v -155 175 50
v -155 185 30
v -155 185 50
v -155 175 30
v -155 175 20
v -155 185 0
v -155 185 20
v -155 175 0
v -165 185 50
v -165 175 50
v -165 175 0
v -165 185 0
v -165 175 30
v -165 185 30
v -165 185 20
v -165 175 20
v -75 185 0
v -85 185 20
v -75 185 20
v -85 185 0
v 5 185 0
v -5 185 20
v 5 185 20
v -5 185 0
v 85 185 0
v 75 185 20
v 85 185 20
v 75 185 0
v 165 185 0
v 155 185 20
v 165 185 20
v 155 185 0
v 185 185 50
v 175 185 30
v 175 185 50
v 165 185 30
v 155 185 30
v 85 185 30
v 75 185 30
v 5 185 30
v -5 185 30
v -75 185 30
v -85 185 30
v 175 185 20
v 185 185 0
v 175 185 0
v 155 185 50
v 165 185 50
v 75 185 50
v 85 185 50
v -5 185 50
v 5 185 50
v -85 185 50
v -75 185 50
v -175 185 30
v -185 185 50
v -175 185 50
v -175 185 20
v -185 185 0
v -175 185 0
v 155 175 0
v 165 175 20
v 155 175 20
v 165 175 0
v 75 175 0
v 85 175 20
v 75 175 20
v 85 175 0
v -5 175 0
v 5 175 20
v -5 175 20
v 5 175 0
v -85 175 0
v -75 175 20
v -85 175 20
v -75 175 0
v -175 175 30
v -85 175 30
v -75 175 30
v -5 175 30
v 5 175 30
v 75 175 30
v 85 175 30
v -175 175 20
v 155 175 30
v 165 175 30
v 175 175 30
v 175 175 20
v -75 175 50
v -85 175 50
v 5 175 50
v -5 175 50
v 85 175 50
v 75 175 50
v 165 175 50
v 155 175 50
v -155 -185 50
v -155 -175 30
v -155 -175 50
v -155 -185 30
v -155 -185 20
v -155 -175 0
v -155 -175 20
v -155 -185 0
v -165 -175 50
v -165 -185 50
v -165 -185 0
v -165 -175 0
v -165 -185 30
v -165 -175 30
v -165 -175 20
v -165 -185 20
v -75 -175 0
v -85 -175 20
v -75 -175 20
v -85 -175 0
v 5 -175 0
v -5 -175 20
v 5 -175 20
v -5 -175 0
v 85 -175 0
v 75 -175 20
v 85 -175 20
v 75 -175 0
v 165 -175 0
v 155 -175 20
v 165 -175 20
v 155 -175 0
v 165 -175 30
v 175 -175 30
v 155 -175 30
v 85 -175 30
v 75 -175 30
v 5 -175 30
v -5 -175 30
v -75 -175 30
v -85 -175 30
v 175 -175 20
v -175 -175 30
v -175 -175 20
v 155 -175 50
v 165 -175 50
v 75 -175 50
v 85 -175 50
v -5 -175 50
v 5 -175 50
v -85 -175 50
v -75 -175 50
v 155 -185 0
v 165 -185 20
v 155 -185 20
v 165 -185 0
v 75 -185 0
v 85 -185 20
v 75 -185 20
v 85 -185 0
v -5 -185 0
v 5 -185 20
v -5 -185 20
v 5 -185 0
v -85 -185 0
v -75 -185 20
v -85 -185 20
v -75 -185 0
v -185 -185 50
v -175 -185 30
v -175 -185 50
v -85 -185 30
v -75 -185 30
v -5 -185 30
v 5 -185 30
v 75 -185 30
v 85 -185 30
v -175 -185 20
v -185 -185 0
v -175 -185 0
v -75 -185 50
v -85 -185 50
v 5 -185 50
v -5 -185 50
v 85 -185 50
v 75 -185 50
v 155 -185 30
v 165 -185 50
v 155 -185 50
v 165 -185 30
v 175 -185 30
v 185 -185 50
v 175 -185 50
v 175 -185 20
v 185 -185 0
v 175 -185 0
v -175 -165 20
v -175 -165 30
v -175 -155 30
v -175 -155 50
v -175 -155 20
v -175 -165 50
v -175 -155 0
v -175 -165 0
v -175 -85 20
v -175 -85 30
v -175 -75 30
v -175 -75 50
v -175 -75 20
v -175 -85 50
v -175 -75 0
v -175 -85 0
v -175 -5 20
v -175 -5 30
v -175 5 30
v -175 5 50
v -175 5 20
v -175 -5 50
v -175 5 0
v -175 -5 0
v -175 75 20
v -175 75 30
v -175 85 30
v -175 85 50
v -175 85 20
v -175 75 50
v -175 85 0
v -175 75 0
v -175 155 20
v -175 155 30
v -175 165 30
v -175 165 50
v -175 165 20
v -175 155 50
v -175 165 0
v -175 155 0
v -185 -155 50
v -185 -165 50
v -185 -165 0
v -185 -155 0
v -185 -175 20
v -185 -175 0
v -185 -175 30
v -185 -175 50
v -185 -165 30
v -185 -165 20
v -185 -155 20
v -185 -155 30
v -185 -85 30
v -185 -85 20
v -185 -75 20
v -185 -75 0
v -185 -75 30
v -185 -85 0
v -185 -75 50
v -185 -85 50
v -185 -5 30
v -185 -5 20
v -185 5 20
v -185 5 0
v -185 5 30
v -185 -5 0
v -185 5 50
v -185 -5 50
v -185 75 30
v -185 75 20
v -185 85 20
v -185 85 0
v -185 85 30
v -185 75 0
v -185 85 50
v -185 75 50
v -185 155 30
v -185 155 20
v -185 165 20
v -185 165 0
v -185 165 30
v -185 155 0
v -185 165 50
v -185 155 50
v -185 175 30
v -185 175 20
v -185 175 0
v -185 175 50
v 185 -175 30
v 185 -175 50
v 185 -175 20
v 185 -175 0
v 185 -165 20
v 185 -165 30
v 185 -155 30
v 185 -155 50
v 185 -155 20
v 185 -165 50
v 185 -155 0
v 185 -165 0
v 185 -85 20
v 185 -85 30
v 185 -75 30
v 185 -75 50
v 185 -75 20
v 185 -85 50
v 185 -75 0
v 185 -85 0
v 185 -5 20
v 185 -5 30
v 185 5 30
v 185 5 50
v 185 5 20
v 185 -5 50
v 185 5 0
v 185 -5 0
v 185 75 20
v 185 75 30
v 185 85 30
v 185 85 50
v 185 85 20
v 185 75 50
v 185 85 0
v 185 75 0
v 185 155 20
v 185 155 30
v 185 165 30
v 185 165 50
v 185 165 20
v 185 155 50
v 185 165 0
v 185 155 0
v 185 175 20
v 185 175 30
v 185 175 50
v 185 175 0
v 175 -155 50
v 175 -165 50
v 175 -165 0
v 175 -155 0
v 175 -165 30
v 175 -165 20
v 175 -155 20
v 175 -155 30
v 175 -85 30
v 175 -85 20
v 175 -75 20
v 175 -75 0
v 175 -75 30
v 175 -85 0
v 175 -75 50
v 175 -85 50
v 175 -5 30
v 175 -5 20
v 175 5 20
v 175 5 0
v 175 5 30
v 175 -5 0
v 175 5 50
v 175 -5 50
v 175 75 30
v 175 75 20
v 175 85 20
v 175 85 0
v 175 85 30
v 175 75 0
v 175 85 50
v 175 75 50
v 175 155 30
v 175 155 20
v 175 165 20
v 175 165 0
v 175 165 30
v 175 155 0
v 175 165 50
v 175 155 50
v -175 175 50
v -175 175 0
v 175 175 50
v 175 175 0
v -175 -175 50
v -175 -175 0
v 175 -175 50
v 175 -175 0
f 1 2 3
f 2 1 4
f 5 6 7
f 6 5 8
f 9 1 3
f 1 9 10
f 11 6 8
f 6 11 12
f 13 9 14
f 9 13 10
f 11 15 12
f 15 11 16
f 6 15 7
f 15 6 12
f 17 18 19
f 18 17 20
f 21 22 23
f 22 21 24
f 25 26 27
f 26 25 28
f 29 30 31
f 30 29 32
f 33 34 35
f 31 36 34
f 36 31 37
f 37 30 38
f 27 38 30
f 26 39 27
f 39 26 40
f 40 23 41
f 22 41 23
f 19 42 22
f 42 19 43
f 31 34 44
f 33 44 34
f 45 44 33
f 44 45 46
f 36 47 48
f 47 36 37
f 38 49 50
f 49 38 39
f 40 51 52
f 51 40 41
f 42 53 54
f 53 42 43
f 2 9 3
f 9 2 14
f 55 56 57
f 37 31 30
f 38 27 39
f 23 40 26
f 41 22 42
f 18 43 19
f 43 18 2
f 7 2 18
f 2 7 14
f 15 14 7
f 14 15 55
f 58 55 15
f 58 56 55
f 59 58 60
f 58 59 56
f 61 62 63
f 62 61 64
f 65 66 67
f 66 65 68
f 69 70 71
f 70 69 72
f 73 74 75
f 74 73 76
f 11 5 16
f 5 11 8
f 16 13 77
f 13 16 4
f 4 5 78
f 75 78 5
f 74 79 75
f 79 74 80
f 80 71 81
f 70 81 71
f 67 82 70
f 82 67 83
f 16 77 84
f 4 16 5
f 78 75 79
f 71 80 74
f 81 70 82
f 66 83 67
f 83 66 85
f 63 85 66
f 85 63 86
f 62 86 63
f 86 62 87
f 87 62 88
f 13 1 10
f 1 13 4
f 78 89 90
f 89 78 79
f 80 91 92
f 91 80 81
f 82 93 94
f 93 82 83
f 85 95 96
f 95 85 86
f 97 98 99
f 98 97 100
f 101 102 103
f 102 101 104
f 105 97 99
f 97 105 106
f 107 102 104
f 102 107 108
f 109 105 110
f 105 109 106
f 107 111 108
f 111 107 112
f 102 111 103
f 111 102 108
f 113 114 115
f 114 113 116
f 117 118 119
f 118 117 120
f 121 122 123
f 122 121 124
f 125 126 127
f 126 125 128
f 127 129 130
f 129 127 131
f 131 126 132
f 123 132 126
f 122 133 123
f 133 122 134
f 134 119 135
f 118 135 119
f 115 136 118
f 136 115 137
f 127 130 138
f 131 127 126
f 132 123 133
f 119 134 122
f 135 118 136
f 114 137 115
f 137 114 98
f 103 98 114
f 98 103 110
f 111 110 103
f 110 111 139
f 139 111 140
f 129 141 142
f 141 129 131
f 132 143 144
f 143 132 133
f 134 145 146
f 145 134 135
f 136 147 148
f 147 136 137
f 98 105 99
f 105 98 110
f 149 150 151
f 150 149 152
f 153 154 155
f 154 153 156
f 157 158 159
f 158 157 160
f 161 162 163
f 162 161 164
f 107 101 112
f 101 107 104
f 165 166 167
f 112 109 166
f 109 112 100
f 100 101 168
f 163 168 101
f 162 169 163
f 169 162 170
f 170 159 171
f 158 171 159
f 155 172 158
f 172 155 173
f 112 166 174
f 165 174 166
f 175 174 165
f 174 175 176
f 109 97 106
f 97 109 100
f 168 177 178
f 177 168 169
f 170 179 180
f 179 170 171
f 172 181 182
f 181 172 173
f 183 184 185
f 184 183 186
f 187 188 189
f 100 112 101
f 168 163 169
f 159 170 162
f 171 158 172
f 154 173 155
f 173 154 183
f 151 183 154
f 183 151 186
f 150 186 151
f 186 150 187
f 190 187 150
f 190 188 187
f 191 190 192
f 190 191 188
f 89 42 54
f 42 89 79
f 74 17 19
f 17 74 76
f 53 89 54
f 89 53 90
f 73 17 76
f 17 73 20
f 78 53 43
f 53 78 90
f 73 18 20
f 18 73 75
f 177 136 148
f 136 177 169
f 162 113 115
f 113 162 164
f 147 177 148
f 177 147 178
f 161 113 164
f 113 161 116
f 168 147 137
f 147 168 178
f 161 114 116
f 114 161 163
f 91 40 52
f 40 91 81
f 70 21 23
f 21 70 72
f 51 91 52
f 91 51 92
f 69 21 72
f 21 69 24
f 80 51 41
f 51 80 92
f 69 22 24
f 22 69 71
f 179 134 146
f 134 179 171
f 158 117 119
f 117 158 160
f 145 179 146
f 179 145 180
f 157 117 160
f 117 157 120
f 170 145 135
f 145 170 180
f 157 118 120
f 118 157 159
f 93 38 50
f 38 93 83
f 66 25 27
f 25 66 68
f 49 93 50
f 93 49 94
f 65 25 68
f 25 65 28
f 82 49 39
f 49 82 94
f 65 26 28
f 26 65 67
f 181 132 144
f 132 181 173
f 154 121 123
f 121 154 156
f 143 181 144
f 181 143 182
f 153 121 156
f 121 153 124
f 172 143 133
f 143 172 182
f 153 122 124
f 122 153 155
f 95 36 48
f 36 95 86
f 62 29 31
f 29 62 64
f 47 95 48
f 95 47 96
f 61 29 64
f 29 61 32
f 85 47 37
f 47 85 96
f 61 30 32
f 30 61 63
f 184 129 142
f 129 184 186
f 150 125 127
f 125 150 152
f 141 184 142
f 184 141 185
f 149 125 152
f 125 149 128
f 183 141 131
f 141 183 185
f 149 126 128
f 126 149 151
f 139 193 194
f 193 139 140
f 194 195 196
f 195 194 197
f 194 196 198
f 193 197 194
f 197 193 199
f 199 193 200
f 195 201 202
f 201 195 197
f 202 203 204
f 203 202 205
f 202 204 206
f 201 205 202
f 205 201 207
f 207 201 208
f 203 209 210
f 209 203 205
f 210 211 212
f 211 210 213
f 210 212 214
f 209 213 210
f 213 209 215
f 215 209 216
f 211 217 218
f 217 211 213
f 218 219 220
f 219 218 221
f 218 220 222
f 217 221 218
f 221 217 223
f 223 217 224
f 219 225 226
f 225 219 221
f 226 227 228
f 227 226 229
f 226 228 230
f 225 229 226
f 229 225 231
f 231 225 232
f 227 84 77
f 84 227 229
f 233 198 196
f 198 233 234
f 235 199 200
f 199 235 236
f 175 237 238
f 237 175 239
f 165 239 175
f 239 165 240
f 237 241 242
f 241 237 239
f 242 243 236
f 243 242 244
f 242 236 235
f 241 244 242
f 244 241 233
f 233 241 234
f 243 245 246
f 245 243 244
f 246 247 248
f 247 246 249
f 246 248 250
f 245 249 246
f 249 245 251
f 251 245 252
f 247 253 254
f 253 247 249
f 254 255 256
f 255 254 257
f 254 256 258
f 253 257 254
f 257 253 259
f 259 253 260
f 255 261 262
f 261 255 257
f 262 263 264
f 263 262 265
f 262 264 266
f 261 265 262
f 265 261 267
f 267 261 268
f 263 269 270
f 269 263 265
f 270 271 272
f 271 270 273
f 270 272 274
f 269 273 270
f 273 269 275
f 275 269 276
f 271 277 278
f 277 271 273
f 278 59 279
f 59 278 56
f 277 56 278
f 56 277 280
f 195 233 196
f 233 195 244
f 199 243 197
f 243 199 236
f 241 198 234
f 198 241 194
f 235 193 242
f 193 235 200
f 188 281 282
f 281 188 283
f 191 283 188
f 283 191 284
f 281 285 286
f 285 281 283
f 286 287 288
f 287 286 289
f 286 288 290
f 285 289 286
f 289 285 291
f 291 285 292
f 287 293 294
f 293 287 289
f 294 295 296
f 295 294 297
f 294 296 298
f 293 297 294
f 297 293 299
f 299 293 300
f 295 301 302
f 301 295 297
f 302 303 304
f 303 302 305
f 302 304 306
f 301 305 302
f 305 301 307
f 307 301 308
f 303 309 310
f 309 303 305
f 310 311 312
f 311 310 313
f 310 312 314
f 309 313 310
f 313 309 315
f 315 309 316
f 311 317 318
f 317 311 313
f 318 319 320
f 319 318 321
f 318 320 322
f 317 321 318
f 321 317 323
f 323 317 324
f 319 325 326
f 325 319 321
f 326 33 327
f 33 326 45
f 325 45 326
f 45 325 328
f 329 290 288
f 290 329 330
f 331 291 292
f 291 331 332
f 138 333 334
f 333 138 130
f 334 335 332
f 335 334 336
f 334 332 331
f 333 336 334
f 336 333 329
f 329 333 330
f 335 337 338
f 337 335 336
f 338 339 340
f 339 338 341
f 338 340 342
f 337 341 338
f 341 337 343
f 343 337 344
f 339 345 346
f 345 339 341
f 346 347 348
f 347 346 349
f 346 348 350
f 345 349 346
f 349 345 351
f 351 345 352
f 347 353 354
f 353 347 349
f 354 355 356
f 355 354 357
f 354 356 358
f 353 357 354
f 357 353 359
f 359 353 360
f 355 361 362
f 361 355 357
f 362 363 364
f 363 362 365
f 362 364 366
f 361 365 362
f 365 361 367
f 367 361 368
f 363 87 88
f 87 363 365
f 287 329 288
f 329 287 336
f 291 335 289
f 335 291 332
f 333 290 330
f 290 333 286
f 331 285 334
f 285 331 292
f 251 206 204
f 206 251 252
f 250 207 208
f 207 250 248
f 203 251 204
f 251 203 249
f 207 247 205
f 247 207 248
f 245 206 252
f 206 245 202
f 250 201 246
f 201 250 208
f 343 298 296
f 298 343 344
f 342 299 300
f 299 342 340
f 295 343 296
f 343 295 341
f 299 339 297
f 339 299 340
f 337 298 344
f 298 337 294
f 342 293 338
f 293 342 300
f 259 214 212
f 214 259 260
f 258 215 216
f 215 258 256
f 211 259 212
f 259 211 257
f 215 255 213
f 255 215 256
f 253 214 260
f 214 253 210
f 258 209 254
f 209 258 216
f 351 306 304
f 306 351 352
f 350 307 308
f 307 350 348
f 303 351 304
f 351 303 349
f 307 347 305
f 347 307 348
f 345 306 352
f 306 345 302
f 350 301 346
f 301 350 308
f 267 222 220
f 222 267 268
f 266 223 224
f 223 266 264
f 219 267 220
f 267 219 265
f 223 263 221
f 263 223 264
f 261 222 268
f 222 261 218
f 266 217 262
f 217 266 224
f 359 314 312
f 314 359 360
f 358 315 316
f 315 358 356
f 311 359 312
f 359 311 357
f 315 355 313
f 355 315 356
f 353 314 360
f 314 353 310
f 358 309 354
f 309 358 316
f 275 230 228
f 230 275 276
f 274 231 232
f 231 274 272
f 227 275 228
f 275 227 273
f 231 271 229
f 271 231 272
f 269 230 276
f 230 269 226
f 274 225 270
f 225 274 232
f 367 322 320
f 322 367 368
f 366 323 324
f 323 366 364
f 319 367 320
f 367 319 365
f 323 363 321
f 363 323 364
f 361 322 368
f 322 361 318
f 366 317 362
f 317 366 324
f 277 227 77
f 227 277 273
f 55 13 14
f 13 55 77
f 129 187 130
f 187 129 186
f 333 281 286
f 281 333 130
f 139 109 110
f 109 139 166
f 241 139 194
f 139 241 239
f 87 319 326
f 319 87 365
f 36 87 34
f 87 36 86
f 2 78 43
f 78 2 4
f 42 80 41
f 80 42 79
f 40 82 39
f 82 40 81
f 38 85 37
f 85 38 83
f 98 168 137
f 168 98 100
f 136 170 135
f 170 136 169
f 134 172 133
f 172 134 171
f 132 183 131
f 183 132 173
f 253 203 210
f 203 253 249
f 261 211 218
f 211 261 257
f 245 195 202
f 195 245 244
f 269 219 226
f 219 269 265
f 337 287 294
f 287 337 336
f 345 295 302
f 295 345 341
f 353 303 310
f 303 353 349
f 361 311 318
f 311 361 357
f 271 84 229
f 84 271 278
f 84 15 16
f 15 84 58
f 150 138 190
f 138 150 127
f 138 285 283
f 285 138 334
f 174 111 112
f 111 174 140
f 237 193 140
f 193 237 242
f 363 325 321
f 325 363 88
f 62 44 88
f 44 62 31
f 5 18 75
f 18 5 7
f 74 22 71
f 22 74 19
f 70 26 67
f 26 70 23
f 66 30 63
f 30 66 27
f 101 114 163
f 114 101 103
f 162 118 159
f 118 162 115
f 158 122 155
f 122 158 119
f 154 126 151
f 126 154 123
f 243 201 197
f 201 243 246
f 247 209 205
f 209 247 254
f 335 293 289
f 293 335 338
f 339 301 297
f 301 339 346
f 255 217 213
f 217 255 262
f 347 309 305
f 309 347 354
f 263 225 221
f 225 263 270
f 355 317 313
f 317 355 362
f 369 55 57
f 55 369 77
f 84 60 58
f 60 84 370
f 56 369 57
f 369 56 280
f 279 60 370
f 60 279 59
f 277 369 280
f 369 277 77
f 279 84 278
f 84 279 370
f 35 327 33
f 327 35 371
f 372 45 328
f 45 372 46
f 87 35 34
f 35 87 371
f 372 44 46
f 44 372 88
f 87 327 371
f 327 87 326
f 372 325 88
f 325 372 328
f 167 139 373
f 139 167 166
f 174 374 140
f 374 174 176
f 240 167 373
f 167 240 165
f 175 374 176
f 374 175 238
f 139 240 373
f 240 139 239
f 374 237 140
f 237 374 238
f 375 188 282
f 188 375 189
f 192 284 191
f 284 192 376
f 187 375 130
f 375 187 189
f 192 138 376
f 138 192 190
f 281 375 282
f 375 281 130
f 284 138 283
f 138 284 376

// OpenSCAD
// Cage slice 6
// Internal cavity: 350 x 350 x 700 mm
// Bar thickness: 10 mm (square)
// Gap between bars: 70 mm (uniform)
// Slice index: 6, slice Z range: [300, 350] (local coordinates 0..50)
// This file places the slice with its bottom on Z=0; when assembling, translate in Z by 300 mm.
// Export to STL with OpenSCAD: Render -> Export as STL.

bar = 10;
gap = 70;
s = bar + gap;
$fn = 64;  // cylinder resolution

x_centers = [-160, -80, 0, 80, 160];
y_centers = [-160, -80, 0, 80, 160];
z_centers = [5, 85, 165, 245, 325, 405, 485, 565, 645];

slice_index = 6;
slice_h = 50;

front_y = 180;
back_y = -180;
left_x = -180;
right_x = 180;
panel_length = 370;

hole_diam = 6.6;

module slice() {
    union() {
        // vertical bars on front and back (along Z)
        for (x = x_centers) {
            translate([x, front_y, slice_h/2]) cube([bar, bar, slice_h], center=true);
            translate([x, back_y, slice_h/2])  cube([bar, bar, slice_h], center=true);
        }
        // vertical bars on left and right (along Z)
        for (y = y_centers) {
            translate([left_x, y, slice_h/2])  cube([bar, bar, slice_h], center=true);
            translate([right_x, y, slice_h/2]) cube([bar, bar, slice_h], center=true);
        }
        // explicit corner vertical bars (ensure 4 corners for M6 rods)
        translate([-180, 180, slice_h/2]) cube([bar, bar, slice_h], center=true);
        translate([180, 180, slice_h/2]) cube([bar, bar, slice_h], center=true);
        translate([-180, -180, slice_h/2]) cube([bar, bar, slice_h], center=true);
        translate([180, -180, slice_h/2]) cube([bar, bar, slice_h], center=true);

        // horizontal bars (10 mm thick in Z) that lie inside this slice
        for (zc = z_centers) {
            z_local = zc - slice_index*slice_h;
            // include this horizontal bar if its center lies within this slice and it fits entirely here
            if (z_local >= bar/2 && z_local <= slice_h - bar/2) {
                // front and back horizontal bars (run along X)
                translate([0, front_y, z_local]) cube([panel_length, bar, bar], center=true);
                translate([0, back_y,  z_local]) cube([panel_length, bar, bar], center=true);
                // left and right horizontal bars (run along Y)
                translate([left_x, 0, z_local]) cube([bar, panel_length, bar], center=true);
                translate([right_x,0, z_local]) cube([bar, panel_length, bar], center=true);
            }
        }
    }
}

difference() {
    slice();
    // four vertical holes for M6 rods through corner bars (slightly longer than slice to ensure clean subtraction)
    translate([-180, 180, slice_h/2]) rotate([0,0,0]) cylinder(h = slice_h*4, r = hole_diam/2, center=true);
    translate([180, 180, slice_h/2]) rotate([0,0,0]) cylinder(h = slice_h*4, r = hole_diam/2, center=true);
    translate([-180, -180, slice_h/2]) rotate([0,0,0]) cylinder(h = slice_h*4, r = hole_diam/2, center=true);
    translate([180, -180, slice_h/2]) rotate([0,0,0]) cylinder(h = slice_h*4, r = hole_diam/2, center=true);
}

slice();
